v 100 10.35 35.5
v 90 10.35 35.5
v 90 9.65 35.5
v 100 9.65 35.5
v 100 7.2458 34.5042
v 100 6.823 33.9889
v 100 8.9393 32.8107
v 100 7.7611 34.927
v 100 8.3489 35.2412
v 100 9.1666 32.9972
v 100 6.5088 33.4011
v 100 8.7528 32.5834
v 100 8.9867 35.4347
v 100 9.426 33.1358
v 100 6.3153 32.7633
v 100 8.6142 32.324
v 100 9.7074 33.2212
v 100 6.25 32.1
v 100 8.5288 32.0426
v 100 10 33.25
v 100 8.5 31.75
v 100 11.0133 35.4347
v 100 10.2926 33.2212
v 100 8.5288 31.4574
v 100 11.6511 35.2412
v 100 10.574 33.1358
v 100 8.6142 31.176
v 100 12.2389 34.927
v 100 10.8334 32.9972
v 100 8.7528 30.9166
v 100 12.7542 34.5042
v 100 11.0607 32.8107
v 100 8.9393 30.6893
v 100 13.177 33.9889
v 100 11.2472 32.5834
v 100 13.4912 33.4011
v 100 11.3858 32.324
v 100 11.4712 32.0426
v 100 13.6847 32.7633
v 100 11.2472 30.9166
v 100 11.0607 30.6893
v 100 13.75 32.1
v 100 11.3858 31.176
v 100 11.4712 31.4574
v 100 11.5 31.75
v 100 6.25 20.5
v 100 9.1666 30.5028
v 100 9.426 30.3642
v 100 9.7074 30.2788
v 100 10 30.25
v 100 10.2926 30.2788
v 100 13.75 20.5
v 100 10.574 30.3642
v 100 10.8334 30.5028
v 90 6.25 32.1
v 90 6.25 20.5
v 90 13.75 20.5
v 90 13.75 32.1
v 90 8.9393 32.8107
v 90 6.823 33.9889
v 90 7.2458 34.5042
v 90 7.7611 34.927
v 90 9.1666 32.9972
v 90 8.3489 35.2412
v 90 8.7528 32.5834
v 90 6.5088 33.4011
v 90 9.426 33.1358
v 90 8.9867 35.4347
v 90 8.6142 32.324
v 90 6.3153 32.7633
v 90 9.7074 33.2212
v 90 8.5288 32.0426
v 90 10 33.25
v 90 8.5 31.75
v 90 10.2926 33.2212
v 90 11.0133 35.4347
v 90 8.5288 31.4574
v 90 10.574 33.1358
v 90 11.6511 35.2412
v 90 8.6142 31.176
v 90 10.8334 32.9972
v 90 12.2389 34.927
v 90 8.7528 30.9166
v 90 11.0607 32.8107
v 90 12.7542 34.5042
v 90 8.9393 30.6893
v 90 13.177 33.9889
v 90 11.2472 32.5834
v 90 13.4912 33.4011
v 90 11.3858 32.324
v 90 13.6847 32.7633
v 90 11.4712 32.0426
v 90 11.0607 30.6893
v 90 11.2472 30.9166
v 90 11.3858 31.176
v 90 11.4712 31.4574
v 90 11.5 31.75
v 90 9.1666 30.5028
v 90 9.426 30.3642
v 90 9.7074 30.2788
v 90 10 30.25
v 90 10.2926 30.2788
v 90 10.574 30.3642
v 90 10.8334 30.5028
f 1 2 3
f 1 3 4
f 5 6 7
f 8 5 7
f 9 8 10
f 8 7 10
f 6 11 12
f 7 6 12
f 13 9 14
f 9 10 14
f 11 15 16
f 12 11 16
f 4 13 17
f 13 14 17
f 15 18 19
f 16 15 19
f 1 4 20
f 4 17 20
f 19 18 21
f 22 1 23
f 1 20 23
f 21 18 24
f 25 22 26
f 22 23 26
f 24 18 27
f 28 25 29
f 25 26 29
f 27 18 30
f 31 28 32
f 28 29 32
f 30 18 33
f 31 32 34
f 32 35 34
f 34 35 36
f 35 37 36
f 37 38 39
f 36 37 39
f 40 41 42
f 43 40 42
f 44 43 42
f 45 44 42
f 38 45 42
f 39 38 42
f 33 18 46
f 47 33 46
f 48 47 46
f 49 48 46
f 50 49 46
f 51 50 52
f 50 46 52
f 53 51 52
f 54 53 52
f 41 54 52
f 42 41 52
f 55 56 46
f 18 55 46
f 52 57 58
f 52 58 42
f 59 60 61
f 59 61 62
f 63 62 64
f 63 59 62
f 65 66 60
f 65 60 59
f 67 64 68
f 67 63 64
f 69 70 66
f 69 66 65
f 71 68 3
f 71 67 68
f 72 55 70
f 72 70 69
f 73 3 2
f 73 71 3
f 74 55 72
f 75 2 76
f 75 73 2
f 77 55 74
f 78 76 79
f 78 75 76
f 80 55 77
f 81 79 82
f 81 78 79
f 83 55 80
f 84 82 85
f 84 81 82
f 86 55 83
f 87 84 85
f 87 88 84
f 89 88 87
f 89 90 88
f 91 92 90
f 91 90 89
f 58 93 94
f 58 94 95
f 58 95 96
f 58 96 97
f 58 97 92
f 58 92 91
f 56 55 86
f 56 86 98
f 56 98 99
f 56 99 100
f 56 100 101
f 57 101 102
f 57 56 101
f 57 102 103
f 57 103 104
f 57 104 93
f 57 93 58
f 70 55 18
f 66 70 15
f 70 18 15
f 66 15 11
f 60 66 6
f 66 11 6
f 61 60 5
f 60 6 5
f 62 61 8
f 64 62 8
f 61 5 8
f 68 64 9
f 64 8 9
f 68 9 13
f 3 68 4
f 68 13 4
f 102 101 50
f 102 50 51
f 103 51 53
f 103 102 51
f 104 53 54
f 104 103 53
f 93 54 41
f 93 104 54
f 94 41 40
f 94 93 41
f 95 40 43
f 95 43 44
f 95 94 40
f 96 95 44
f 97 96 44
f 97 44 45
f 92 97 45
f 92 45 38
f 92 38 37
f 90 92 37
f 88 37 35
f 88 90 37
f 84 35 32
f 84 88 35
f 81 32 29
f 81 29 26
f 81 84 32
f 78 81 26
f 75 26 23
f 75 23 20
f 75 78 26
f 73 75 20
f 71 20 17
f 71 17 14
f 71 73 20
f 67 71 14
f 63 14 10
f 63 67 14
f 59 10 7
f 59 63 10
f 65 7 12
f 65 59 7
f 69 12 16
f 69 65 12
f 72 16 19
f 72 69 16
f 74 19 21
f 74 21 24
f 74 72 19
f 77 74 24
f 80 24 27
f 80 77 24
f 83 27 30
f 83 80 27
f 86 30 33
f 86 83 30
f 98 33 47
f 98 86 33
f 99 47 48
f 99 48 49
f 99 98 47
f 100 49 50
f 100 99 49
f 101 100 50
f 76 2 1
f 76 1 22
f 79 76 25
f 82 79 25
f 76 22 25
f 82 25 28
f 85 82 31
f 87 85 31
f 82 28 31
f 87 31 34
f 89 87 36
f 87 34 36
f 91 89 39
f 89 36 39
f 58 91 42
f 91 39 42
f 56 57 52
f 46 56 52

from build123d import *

# Parameters (mm, degrees)
CYLINDER005_R        = 1.5
CYLINDER005_DEPTH    = 10
BOX022_W             = 10
BOX022_H             = 7.5
BOX022_DEPTH         = 15
FILLET002008005014_R = 3.4


with BuildPart() as cylinder005:
    # Cylinder005 → Cylinder005 (new body)
    with BuildSketch(Plane(origin=(90, 10, 28.25), x_dir=(0, 0, -1), z_dir=(1, 0, 0))):
        Circle(CYLINDER005_R)
    extrude(amount=CYLINDER005_DEPTH)


with BuildPart() as fillet002008005014:
    # Box022 → Box022 (new body)
    with BuildSketch(Plane(origin=(90, 6.25, 17), x_dir=(1, 0, 0), z_dir=(0, 0, 1))):
        with Locations((5, 3.75)):
            Rectangle(BOX022_W, BOX022_H)
    extrude(amount=BOX022_DEPTH)

    # Cut001005: cut Cylinder005
    add(cylinder005.part, mode=Mode.SUBTRACT)

    # Fillet002008005014
    fillet002008005014_edges = [fillet002008005014.edges().sort_by_distance(p)[0] for p in [
        (95, 6.25, 32),
        (95, 13.75, 32),
    ]]
    fillet(fillet002008005014_edges, radius=FILLET002008005014_R)


with BuildPart() as fillet002008005014_1:
    # Fillet002008005014 placement: moved
    add(fillet002008005014.part.moved(Location((0, 0, 3.5))))


solid = fillet002008005014_1.part
